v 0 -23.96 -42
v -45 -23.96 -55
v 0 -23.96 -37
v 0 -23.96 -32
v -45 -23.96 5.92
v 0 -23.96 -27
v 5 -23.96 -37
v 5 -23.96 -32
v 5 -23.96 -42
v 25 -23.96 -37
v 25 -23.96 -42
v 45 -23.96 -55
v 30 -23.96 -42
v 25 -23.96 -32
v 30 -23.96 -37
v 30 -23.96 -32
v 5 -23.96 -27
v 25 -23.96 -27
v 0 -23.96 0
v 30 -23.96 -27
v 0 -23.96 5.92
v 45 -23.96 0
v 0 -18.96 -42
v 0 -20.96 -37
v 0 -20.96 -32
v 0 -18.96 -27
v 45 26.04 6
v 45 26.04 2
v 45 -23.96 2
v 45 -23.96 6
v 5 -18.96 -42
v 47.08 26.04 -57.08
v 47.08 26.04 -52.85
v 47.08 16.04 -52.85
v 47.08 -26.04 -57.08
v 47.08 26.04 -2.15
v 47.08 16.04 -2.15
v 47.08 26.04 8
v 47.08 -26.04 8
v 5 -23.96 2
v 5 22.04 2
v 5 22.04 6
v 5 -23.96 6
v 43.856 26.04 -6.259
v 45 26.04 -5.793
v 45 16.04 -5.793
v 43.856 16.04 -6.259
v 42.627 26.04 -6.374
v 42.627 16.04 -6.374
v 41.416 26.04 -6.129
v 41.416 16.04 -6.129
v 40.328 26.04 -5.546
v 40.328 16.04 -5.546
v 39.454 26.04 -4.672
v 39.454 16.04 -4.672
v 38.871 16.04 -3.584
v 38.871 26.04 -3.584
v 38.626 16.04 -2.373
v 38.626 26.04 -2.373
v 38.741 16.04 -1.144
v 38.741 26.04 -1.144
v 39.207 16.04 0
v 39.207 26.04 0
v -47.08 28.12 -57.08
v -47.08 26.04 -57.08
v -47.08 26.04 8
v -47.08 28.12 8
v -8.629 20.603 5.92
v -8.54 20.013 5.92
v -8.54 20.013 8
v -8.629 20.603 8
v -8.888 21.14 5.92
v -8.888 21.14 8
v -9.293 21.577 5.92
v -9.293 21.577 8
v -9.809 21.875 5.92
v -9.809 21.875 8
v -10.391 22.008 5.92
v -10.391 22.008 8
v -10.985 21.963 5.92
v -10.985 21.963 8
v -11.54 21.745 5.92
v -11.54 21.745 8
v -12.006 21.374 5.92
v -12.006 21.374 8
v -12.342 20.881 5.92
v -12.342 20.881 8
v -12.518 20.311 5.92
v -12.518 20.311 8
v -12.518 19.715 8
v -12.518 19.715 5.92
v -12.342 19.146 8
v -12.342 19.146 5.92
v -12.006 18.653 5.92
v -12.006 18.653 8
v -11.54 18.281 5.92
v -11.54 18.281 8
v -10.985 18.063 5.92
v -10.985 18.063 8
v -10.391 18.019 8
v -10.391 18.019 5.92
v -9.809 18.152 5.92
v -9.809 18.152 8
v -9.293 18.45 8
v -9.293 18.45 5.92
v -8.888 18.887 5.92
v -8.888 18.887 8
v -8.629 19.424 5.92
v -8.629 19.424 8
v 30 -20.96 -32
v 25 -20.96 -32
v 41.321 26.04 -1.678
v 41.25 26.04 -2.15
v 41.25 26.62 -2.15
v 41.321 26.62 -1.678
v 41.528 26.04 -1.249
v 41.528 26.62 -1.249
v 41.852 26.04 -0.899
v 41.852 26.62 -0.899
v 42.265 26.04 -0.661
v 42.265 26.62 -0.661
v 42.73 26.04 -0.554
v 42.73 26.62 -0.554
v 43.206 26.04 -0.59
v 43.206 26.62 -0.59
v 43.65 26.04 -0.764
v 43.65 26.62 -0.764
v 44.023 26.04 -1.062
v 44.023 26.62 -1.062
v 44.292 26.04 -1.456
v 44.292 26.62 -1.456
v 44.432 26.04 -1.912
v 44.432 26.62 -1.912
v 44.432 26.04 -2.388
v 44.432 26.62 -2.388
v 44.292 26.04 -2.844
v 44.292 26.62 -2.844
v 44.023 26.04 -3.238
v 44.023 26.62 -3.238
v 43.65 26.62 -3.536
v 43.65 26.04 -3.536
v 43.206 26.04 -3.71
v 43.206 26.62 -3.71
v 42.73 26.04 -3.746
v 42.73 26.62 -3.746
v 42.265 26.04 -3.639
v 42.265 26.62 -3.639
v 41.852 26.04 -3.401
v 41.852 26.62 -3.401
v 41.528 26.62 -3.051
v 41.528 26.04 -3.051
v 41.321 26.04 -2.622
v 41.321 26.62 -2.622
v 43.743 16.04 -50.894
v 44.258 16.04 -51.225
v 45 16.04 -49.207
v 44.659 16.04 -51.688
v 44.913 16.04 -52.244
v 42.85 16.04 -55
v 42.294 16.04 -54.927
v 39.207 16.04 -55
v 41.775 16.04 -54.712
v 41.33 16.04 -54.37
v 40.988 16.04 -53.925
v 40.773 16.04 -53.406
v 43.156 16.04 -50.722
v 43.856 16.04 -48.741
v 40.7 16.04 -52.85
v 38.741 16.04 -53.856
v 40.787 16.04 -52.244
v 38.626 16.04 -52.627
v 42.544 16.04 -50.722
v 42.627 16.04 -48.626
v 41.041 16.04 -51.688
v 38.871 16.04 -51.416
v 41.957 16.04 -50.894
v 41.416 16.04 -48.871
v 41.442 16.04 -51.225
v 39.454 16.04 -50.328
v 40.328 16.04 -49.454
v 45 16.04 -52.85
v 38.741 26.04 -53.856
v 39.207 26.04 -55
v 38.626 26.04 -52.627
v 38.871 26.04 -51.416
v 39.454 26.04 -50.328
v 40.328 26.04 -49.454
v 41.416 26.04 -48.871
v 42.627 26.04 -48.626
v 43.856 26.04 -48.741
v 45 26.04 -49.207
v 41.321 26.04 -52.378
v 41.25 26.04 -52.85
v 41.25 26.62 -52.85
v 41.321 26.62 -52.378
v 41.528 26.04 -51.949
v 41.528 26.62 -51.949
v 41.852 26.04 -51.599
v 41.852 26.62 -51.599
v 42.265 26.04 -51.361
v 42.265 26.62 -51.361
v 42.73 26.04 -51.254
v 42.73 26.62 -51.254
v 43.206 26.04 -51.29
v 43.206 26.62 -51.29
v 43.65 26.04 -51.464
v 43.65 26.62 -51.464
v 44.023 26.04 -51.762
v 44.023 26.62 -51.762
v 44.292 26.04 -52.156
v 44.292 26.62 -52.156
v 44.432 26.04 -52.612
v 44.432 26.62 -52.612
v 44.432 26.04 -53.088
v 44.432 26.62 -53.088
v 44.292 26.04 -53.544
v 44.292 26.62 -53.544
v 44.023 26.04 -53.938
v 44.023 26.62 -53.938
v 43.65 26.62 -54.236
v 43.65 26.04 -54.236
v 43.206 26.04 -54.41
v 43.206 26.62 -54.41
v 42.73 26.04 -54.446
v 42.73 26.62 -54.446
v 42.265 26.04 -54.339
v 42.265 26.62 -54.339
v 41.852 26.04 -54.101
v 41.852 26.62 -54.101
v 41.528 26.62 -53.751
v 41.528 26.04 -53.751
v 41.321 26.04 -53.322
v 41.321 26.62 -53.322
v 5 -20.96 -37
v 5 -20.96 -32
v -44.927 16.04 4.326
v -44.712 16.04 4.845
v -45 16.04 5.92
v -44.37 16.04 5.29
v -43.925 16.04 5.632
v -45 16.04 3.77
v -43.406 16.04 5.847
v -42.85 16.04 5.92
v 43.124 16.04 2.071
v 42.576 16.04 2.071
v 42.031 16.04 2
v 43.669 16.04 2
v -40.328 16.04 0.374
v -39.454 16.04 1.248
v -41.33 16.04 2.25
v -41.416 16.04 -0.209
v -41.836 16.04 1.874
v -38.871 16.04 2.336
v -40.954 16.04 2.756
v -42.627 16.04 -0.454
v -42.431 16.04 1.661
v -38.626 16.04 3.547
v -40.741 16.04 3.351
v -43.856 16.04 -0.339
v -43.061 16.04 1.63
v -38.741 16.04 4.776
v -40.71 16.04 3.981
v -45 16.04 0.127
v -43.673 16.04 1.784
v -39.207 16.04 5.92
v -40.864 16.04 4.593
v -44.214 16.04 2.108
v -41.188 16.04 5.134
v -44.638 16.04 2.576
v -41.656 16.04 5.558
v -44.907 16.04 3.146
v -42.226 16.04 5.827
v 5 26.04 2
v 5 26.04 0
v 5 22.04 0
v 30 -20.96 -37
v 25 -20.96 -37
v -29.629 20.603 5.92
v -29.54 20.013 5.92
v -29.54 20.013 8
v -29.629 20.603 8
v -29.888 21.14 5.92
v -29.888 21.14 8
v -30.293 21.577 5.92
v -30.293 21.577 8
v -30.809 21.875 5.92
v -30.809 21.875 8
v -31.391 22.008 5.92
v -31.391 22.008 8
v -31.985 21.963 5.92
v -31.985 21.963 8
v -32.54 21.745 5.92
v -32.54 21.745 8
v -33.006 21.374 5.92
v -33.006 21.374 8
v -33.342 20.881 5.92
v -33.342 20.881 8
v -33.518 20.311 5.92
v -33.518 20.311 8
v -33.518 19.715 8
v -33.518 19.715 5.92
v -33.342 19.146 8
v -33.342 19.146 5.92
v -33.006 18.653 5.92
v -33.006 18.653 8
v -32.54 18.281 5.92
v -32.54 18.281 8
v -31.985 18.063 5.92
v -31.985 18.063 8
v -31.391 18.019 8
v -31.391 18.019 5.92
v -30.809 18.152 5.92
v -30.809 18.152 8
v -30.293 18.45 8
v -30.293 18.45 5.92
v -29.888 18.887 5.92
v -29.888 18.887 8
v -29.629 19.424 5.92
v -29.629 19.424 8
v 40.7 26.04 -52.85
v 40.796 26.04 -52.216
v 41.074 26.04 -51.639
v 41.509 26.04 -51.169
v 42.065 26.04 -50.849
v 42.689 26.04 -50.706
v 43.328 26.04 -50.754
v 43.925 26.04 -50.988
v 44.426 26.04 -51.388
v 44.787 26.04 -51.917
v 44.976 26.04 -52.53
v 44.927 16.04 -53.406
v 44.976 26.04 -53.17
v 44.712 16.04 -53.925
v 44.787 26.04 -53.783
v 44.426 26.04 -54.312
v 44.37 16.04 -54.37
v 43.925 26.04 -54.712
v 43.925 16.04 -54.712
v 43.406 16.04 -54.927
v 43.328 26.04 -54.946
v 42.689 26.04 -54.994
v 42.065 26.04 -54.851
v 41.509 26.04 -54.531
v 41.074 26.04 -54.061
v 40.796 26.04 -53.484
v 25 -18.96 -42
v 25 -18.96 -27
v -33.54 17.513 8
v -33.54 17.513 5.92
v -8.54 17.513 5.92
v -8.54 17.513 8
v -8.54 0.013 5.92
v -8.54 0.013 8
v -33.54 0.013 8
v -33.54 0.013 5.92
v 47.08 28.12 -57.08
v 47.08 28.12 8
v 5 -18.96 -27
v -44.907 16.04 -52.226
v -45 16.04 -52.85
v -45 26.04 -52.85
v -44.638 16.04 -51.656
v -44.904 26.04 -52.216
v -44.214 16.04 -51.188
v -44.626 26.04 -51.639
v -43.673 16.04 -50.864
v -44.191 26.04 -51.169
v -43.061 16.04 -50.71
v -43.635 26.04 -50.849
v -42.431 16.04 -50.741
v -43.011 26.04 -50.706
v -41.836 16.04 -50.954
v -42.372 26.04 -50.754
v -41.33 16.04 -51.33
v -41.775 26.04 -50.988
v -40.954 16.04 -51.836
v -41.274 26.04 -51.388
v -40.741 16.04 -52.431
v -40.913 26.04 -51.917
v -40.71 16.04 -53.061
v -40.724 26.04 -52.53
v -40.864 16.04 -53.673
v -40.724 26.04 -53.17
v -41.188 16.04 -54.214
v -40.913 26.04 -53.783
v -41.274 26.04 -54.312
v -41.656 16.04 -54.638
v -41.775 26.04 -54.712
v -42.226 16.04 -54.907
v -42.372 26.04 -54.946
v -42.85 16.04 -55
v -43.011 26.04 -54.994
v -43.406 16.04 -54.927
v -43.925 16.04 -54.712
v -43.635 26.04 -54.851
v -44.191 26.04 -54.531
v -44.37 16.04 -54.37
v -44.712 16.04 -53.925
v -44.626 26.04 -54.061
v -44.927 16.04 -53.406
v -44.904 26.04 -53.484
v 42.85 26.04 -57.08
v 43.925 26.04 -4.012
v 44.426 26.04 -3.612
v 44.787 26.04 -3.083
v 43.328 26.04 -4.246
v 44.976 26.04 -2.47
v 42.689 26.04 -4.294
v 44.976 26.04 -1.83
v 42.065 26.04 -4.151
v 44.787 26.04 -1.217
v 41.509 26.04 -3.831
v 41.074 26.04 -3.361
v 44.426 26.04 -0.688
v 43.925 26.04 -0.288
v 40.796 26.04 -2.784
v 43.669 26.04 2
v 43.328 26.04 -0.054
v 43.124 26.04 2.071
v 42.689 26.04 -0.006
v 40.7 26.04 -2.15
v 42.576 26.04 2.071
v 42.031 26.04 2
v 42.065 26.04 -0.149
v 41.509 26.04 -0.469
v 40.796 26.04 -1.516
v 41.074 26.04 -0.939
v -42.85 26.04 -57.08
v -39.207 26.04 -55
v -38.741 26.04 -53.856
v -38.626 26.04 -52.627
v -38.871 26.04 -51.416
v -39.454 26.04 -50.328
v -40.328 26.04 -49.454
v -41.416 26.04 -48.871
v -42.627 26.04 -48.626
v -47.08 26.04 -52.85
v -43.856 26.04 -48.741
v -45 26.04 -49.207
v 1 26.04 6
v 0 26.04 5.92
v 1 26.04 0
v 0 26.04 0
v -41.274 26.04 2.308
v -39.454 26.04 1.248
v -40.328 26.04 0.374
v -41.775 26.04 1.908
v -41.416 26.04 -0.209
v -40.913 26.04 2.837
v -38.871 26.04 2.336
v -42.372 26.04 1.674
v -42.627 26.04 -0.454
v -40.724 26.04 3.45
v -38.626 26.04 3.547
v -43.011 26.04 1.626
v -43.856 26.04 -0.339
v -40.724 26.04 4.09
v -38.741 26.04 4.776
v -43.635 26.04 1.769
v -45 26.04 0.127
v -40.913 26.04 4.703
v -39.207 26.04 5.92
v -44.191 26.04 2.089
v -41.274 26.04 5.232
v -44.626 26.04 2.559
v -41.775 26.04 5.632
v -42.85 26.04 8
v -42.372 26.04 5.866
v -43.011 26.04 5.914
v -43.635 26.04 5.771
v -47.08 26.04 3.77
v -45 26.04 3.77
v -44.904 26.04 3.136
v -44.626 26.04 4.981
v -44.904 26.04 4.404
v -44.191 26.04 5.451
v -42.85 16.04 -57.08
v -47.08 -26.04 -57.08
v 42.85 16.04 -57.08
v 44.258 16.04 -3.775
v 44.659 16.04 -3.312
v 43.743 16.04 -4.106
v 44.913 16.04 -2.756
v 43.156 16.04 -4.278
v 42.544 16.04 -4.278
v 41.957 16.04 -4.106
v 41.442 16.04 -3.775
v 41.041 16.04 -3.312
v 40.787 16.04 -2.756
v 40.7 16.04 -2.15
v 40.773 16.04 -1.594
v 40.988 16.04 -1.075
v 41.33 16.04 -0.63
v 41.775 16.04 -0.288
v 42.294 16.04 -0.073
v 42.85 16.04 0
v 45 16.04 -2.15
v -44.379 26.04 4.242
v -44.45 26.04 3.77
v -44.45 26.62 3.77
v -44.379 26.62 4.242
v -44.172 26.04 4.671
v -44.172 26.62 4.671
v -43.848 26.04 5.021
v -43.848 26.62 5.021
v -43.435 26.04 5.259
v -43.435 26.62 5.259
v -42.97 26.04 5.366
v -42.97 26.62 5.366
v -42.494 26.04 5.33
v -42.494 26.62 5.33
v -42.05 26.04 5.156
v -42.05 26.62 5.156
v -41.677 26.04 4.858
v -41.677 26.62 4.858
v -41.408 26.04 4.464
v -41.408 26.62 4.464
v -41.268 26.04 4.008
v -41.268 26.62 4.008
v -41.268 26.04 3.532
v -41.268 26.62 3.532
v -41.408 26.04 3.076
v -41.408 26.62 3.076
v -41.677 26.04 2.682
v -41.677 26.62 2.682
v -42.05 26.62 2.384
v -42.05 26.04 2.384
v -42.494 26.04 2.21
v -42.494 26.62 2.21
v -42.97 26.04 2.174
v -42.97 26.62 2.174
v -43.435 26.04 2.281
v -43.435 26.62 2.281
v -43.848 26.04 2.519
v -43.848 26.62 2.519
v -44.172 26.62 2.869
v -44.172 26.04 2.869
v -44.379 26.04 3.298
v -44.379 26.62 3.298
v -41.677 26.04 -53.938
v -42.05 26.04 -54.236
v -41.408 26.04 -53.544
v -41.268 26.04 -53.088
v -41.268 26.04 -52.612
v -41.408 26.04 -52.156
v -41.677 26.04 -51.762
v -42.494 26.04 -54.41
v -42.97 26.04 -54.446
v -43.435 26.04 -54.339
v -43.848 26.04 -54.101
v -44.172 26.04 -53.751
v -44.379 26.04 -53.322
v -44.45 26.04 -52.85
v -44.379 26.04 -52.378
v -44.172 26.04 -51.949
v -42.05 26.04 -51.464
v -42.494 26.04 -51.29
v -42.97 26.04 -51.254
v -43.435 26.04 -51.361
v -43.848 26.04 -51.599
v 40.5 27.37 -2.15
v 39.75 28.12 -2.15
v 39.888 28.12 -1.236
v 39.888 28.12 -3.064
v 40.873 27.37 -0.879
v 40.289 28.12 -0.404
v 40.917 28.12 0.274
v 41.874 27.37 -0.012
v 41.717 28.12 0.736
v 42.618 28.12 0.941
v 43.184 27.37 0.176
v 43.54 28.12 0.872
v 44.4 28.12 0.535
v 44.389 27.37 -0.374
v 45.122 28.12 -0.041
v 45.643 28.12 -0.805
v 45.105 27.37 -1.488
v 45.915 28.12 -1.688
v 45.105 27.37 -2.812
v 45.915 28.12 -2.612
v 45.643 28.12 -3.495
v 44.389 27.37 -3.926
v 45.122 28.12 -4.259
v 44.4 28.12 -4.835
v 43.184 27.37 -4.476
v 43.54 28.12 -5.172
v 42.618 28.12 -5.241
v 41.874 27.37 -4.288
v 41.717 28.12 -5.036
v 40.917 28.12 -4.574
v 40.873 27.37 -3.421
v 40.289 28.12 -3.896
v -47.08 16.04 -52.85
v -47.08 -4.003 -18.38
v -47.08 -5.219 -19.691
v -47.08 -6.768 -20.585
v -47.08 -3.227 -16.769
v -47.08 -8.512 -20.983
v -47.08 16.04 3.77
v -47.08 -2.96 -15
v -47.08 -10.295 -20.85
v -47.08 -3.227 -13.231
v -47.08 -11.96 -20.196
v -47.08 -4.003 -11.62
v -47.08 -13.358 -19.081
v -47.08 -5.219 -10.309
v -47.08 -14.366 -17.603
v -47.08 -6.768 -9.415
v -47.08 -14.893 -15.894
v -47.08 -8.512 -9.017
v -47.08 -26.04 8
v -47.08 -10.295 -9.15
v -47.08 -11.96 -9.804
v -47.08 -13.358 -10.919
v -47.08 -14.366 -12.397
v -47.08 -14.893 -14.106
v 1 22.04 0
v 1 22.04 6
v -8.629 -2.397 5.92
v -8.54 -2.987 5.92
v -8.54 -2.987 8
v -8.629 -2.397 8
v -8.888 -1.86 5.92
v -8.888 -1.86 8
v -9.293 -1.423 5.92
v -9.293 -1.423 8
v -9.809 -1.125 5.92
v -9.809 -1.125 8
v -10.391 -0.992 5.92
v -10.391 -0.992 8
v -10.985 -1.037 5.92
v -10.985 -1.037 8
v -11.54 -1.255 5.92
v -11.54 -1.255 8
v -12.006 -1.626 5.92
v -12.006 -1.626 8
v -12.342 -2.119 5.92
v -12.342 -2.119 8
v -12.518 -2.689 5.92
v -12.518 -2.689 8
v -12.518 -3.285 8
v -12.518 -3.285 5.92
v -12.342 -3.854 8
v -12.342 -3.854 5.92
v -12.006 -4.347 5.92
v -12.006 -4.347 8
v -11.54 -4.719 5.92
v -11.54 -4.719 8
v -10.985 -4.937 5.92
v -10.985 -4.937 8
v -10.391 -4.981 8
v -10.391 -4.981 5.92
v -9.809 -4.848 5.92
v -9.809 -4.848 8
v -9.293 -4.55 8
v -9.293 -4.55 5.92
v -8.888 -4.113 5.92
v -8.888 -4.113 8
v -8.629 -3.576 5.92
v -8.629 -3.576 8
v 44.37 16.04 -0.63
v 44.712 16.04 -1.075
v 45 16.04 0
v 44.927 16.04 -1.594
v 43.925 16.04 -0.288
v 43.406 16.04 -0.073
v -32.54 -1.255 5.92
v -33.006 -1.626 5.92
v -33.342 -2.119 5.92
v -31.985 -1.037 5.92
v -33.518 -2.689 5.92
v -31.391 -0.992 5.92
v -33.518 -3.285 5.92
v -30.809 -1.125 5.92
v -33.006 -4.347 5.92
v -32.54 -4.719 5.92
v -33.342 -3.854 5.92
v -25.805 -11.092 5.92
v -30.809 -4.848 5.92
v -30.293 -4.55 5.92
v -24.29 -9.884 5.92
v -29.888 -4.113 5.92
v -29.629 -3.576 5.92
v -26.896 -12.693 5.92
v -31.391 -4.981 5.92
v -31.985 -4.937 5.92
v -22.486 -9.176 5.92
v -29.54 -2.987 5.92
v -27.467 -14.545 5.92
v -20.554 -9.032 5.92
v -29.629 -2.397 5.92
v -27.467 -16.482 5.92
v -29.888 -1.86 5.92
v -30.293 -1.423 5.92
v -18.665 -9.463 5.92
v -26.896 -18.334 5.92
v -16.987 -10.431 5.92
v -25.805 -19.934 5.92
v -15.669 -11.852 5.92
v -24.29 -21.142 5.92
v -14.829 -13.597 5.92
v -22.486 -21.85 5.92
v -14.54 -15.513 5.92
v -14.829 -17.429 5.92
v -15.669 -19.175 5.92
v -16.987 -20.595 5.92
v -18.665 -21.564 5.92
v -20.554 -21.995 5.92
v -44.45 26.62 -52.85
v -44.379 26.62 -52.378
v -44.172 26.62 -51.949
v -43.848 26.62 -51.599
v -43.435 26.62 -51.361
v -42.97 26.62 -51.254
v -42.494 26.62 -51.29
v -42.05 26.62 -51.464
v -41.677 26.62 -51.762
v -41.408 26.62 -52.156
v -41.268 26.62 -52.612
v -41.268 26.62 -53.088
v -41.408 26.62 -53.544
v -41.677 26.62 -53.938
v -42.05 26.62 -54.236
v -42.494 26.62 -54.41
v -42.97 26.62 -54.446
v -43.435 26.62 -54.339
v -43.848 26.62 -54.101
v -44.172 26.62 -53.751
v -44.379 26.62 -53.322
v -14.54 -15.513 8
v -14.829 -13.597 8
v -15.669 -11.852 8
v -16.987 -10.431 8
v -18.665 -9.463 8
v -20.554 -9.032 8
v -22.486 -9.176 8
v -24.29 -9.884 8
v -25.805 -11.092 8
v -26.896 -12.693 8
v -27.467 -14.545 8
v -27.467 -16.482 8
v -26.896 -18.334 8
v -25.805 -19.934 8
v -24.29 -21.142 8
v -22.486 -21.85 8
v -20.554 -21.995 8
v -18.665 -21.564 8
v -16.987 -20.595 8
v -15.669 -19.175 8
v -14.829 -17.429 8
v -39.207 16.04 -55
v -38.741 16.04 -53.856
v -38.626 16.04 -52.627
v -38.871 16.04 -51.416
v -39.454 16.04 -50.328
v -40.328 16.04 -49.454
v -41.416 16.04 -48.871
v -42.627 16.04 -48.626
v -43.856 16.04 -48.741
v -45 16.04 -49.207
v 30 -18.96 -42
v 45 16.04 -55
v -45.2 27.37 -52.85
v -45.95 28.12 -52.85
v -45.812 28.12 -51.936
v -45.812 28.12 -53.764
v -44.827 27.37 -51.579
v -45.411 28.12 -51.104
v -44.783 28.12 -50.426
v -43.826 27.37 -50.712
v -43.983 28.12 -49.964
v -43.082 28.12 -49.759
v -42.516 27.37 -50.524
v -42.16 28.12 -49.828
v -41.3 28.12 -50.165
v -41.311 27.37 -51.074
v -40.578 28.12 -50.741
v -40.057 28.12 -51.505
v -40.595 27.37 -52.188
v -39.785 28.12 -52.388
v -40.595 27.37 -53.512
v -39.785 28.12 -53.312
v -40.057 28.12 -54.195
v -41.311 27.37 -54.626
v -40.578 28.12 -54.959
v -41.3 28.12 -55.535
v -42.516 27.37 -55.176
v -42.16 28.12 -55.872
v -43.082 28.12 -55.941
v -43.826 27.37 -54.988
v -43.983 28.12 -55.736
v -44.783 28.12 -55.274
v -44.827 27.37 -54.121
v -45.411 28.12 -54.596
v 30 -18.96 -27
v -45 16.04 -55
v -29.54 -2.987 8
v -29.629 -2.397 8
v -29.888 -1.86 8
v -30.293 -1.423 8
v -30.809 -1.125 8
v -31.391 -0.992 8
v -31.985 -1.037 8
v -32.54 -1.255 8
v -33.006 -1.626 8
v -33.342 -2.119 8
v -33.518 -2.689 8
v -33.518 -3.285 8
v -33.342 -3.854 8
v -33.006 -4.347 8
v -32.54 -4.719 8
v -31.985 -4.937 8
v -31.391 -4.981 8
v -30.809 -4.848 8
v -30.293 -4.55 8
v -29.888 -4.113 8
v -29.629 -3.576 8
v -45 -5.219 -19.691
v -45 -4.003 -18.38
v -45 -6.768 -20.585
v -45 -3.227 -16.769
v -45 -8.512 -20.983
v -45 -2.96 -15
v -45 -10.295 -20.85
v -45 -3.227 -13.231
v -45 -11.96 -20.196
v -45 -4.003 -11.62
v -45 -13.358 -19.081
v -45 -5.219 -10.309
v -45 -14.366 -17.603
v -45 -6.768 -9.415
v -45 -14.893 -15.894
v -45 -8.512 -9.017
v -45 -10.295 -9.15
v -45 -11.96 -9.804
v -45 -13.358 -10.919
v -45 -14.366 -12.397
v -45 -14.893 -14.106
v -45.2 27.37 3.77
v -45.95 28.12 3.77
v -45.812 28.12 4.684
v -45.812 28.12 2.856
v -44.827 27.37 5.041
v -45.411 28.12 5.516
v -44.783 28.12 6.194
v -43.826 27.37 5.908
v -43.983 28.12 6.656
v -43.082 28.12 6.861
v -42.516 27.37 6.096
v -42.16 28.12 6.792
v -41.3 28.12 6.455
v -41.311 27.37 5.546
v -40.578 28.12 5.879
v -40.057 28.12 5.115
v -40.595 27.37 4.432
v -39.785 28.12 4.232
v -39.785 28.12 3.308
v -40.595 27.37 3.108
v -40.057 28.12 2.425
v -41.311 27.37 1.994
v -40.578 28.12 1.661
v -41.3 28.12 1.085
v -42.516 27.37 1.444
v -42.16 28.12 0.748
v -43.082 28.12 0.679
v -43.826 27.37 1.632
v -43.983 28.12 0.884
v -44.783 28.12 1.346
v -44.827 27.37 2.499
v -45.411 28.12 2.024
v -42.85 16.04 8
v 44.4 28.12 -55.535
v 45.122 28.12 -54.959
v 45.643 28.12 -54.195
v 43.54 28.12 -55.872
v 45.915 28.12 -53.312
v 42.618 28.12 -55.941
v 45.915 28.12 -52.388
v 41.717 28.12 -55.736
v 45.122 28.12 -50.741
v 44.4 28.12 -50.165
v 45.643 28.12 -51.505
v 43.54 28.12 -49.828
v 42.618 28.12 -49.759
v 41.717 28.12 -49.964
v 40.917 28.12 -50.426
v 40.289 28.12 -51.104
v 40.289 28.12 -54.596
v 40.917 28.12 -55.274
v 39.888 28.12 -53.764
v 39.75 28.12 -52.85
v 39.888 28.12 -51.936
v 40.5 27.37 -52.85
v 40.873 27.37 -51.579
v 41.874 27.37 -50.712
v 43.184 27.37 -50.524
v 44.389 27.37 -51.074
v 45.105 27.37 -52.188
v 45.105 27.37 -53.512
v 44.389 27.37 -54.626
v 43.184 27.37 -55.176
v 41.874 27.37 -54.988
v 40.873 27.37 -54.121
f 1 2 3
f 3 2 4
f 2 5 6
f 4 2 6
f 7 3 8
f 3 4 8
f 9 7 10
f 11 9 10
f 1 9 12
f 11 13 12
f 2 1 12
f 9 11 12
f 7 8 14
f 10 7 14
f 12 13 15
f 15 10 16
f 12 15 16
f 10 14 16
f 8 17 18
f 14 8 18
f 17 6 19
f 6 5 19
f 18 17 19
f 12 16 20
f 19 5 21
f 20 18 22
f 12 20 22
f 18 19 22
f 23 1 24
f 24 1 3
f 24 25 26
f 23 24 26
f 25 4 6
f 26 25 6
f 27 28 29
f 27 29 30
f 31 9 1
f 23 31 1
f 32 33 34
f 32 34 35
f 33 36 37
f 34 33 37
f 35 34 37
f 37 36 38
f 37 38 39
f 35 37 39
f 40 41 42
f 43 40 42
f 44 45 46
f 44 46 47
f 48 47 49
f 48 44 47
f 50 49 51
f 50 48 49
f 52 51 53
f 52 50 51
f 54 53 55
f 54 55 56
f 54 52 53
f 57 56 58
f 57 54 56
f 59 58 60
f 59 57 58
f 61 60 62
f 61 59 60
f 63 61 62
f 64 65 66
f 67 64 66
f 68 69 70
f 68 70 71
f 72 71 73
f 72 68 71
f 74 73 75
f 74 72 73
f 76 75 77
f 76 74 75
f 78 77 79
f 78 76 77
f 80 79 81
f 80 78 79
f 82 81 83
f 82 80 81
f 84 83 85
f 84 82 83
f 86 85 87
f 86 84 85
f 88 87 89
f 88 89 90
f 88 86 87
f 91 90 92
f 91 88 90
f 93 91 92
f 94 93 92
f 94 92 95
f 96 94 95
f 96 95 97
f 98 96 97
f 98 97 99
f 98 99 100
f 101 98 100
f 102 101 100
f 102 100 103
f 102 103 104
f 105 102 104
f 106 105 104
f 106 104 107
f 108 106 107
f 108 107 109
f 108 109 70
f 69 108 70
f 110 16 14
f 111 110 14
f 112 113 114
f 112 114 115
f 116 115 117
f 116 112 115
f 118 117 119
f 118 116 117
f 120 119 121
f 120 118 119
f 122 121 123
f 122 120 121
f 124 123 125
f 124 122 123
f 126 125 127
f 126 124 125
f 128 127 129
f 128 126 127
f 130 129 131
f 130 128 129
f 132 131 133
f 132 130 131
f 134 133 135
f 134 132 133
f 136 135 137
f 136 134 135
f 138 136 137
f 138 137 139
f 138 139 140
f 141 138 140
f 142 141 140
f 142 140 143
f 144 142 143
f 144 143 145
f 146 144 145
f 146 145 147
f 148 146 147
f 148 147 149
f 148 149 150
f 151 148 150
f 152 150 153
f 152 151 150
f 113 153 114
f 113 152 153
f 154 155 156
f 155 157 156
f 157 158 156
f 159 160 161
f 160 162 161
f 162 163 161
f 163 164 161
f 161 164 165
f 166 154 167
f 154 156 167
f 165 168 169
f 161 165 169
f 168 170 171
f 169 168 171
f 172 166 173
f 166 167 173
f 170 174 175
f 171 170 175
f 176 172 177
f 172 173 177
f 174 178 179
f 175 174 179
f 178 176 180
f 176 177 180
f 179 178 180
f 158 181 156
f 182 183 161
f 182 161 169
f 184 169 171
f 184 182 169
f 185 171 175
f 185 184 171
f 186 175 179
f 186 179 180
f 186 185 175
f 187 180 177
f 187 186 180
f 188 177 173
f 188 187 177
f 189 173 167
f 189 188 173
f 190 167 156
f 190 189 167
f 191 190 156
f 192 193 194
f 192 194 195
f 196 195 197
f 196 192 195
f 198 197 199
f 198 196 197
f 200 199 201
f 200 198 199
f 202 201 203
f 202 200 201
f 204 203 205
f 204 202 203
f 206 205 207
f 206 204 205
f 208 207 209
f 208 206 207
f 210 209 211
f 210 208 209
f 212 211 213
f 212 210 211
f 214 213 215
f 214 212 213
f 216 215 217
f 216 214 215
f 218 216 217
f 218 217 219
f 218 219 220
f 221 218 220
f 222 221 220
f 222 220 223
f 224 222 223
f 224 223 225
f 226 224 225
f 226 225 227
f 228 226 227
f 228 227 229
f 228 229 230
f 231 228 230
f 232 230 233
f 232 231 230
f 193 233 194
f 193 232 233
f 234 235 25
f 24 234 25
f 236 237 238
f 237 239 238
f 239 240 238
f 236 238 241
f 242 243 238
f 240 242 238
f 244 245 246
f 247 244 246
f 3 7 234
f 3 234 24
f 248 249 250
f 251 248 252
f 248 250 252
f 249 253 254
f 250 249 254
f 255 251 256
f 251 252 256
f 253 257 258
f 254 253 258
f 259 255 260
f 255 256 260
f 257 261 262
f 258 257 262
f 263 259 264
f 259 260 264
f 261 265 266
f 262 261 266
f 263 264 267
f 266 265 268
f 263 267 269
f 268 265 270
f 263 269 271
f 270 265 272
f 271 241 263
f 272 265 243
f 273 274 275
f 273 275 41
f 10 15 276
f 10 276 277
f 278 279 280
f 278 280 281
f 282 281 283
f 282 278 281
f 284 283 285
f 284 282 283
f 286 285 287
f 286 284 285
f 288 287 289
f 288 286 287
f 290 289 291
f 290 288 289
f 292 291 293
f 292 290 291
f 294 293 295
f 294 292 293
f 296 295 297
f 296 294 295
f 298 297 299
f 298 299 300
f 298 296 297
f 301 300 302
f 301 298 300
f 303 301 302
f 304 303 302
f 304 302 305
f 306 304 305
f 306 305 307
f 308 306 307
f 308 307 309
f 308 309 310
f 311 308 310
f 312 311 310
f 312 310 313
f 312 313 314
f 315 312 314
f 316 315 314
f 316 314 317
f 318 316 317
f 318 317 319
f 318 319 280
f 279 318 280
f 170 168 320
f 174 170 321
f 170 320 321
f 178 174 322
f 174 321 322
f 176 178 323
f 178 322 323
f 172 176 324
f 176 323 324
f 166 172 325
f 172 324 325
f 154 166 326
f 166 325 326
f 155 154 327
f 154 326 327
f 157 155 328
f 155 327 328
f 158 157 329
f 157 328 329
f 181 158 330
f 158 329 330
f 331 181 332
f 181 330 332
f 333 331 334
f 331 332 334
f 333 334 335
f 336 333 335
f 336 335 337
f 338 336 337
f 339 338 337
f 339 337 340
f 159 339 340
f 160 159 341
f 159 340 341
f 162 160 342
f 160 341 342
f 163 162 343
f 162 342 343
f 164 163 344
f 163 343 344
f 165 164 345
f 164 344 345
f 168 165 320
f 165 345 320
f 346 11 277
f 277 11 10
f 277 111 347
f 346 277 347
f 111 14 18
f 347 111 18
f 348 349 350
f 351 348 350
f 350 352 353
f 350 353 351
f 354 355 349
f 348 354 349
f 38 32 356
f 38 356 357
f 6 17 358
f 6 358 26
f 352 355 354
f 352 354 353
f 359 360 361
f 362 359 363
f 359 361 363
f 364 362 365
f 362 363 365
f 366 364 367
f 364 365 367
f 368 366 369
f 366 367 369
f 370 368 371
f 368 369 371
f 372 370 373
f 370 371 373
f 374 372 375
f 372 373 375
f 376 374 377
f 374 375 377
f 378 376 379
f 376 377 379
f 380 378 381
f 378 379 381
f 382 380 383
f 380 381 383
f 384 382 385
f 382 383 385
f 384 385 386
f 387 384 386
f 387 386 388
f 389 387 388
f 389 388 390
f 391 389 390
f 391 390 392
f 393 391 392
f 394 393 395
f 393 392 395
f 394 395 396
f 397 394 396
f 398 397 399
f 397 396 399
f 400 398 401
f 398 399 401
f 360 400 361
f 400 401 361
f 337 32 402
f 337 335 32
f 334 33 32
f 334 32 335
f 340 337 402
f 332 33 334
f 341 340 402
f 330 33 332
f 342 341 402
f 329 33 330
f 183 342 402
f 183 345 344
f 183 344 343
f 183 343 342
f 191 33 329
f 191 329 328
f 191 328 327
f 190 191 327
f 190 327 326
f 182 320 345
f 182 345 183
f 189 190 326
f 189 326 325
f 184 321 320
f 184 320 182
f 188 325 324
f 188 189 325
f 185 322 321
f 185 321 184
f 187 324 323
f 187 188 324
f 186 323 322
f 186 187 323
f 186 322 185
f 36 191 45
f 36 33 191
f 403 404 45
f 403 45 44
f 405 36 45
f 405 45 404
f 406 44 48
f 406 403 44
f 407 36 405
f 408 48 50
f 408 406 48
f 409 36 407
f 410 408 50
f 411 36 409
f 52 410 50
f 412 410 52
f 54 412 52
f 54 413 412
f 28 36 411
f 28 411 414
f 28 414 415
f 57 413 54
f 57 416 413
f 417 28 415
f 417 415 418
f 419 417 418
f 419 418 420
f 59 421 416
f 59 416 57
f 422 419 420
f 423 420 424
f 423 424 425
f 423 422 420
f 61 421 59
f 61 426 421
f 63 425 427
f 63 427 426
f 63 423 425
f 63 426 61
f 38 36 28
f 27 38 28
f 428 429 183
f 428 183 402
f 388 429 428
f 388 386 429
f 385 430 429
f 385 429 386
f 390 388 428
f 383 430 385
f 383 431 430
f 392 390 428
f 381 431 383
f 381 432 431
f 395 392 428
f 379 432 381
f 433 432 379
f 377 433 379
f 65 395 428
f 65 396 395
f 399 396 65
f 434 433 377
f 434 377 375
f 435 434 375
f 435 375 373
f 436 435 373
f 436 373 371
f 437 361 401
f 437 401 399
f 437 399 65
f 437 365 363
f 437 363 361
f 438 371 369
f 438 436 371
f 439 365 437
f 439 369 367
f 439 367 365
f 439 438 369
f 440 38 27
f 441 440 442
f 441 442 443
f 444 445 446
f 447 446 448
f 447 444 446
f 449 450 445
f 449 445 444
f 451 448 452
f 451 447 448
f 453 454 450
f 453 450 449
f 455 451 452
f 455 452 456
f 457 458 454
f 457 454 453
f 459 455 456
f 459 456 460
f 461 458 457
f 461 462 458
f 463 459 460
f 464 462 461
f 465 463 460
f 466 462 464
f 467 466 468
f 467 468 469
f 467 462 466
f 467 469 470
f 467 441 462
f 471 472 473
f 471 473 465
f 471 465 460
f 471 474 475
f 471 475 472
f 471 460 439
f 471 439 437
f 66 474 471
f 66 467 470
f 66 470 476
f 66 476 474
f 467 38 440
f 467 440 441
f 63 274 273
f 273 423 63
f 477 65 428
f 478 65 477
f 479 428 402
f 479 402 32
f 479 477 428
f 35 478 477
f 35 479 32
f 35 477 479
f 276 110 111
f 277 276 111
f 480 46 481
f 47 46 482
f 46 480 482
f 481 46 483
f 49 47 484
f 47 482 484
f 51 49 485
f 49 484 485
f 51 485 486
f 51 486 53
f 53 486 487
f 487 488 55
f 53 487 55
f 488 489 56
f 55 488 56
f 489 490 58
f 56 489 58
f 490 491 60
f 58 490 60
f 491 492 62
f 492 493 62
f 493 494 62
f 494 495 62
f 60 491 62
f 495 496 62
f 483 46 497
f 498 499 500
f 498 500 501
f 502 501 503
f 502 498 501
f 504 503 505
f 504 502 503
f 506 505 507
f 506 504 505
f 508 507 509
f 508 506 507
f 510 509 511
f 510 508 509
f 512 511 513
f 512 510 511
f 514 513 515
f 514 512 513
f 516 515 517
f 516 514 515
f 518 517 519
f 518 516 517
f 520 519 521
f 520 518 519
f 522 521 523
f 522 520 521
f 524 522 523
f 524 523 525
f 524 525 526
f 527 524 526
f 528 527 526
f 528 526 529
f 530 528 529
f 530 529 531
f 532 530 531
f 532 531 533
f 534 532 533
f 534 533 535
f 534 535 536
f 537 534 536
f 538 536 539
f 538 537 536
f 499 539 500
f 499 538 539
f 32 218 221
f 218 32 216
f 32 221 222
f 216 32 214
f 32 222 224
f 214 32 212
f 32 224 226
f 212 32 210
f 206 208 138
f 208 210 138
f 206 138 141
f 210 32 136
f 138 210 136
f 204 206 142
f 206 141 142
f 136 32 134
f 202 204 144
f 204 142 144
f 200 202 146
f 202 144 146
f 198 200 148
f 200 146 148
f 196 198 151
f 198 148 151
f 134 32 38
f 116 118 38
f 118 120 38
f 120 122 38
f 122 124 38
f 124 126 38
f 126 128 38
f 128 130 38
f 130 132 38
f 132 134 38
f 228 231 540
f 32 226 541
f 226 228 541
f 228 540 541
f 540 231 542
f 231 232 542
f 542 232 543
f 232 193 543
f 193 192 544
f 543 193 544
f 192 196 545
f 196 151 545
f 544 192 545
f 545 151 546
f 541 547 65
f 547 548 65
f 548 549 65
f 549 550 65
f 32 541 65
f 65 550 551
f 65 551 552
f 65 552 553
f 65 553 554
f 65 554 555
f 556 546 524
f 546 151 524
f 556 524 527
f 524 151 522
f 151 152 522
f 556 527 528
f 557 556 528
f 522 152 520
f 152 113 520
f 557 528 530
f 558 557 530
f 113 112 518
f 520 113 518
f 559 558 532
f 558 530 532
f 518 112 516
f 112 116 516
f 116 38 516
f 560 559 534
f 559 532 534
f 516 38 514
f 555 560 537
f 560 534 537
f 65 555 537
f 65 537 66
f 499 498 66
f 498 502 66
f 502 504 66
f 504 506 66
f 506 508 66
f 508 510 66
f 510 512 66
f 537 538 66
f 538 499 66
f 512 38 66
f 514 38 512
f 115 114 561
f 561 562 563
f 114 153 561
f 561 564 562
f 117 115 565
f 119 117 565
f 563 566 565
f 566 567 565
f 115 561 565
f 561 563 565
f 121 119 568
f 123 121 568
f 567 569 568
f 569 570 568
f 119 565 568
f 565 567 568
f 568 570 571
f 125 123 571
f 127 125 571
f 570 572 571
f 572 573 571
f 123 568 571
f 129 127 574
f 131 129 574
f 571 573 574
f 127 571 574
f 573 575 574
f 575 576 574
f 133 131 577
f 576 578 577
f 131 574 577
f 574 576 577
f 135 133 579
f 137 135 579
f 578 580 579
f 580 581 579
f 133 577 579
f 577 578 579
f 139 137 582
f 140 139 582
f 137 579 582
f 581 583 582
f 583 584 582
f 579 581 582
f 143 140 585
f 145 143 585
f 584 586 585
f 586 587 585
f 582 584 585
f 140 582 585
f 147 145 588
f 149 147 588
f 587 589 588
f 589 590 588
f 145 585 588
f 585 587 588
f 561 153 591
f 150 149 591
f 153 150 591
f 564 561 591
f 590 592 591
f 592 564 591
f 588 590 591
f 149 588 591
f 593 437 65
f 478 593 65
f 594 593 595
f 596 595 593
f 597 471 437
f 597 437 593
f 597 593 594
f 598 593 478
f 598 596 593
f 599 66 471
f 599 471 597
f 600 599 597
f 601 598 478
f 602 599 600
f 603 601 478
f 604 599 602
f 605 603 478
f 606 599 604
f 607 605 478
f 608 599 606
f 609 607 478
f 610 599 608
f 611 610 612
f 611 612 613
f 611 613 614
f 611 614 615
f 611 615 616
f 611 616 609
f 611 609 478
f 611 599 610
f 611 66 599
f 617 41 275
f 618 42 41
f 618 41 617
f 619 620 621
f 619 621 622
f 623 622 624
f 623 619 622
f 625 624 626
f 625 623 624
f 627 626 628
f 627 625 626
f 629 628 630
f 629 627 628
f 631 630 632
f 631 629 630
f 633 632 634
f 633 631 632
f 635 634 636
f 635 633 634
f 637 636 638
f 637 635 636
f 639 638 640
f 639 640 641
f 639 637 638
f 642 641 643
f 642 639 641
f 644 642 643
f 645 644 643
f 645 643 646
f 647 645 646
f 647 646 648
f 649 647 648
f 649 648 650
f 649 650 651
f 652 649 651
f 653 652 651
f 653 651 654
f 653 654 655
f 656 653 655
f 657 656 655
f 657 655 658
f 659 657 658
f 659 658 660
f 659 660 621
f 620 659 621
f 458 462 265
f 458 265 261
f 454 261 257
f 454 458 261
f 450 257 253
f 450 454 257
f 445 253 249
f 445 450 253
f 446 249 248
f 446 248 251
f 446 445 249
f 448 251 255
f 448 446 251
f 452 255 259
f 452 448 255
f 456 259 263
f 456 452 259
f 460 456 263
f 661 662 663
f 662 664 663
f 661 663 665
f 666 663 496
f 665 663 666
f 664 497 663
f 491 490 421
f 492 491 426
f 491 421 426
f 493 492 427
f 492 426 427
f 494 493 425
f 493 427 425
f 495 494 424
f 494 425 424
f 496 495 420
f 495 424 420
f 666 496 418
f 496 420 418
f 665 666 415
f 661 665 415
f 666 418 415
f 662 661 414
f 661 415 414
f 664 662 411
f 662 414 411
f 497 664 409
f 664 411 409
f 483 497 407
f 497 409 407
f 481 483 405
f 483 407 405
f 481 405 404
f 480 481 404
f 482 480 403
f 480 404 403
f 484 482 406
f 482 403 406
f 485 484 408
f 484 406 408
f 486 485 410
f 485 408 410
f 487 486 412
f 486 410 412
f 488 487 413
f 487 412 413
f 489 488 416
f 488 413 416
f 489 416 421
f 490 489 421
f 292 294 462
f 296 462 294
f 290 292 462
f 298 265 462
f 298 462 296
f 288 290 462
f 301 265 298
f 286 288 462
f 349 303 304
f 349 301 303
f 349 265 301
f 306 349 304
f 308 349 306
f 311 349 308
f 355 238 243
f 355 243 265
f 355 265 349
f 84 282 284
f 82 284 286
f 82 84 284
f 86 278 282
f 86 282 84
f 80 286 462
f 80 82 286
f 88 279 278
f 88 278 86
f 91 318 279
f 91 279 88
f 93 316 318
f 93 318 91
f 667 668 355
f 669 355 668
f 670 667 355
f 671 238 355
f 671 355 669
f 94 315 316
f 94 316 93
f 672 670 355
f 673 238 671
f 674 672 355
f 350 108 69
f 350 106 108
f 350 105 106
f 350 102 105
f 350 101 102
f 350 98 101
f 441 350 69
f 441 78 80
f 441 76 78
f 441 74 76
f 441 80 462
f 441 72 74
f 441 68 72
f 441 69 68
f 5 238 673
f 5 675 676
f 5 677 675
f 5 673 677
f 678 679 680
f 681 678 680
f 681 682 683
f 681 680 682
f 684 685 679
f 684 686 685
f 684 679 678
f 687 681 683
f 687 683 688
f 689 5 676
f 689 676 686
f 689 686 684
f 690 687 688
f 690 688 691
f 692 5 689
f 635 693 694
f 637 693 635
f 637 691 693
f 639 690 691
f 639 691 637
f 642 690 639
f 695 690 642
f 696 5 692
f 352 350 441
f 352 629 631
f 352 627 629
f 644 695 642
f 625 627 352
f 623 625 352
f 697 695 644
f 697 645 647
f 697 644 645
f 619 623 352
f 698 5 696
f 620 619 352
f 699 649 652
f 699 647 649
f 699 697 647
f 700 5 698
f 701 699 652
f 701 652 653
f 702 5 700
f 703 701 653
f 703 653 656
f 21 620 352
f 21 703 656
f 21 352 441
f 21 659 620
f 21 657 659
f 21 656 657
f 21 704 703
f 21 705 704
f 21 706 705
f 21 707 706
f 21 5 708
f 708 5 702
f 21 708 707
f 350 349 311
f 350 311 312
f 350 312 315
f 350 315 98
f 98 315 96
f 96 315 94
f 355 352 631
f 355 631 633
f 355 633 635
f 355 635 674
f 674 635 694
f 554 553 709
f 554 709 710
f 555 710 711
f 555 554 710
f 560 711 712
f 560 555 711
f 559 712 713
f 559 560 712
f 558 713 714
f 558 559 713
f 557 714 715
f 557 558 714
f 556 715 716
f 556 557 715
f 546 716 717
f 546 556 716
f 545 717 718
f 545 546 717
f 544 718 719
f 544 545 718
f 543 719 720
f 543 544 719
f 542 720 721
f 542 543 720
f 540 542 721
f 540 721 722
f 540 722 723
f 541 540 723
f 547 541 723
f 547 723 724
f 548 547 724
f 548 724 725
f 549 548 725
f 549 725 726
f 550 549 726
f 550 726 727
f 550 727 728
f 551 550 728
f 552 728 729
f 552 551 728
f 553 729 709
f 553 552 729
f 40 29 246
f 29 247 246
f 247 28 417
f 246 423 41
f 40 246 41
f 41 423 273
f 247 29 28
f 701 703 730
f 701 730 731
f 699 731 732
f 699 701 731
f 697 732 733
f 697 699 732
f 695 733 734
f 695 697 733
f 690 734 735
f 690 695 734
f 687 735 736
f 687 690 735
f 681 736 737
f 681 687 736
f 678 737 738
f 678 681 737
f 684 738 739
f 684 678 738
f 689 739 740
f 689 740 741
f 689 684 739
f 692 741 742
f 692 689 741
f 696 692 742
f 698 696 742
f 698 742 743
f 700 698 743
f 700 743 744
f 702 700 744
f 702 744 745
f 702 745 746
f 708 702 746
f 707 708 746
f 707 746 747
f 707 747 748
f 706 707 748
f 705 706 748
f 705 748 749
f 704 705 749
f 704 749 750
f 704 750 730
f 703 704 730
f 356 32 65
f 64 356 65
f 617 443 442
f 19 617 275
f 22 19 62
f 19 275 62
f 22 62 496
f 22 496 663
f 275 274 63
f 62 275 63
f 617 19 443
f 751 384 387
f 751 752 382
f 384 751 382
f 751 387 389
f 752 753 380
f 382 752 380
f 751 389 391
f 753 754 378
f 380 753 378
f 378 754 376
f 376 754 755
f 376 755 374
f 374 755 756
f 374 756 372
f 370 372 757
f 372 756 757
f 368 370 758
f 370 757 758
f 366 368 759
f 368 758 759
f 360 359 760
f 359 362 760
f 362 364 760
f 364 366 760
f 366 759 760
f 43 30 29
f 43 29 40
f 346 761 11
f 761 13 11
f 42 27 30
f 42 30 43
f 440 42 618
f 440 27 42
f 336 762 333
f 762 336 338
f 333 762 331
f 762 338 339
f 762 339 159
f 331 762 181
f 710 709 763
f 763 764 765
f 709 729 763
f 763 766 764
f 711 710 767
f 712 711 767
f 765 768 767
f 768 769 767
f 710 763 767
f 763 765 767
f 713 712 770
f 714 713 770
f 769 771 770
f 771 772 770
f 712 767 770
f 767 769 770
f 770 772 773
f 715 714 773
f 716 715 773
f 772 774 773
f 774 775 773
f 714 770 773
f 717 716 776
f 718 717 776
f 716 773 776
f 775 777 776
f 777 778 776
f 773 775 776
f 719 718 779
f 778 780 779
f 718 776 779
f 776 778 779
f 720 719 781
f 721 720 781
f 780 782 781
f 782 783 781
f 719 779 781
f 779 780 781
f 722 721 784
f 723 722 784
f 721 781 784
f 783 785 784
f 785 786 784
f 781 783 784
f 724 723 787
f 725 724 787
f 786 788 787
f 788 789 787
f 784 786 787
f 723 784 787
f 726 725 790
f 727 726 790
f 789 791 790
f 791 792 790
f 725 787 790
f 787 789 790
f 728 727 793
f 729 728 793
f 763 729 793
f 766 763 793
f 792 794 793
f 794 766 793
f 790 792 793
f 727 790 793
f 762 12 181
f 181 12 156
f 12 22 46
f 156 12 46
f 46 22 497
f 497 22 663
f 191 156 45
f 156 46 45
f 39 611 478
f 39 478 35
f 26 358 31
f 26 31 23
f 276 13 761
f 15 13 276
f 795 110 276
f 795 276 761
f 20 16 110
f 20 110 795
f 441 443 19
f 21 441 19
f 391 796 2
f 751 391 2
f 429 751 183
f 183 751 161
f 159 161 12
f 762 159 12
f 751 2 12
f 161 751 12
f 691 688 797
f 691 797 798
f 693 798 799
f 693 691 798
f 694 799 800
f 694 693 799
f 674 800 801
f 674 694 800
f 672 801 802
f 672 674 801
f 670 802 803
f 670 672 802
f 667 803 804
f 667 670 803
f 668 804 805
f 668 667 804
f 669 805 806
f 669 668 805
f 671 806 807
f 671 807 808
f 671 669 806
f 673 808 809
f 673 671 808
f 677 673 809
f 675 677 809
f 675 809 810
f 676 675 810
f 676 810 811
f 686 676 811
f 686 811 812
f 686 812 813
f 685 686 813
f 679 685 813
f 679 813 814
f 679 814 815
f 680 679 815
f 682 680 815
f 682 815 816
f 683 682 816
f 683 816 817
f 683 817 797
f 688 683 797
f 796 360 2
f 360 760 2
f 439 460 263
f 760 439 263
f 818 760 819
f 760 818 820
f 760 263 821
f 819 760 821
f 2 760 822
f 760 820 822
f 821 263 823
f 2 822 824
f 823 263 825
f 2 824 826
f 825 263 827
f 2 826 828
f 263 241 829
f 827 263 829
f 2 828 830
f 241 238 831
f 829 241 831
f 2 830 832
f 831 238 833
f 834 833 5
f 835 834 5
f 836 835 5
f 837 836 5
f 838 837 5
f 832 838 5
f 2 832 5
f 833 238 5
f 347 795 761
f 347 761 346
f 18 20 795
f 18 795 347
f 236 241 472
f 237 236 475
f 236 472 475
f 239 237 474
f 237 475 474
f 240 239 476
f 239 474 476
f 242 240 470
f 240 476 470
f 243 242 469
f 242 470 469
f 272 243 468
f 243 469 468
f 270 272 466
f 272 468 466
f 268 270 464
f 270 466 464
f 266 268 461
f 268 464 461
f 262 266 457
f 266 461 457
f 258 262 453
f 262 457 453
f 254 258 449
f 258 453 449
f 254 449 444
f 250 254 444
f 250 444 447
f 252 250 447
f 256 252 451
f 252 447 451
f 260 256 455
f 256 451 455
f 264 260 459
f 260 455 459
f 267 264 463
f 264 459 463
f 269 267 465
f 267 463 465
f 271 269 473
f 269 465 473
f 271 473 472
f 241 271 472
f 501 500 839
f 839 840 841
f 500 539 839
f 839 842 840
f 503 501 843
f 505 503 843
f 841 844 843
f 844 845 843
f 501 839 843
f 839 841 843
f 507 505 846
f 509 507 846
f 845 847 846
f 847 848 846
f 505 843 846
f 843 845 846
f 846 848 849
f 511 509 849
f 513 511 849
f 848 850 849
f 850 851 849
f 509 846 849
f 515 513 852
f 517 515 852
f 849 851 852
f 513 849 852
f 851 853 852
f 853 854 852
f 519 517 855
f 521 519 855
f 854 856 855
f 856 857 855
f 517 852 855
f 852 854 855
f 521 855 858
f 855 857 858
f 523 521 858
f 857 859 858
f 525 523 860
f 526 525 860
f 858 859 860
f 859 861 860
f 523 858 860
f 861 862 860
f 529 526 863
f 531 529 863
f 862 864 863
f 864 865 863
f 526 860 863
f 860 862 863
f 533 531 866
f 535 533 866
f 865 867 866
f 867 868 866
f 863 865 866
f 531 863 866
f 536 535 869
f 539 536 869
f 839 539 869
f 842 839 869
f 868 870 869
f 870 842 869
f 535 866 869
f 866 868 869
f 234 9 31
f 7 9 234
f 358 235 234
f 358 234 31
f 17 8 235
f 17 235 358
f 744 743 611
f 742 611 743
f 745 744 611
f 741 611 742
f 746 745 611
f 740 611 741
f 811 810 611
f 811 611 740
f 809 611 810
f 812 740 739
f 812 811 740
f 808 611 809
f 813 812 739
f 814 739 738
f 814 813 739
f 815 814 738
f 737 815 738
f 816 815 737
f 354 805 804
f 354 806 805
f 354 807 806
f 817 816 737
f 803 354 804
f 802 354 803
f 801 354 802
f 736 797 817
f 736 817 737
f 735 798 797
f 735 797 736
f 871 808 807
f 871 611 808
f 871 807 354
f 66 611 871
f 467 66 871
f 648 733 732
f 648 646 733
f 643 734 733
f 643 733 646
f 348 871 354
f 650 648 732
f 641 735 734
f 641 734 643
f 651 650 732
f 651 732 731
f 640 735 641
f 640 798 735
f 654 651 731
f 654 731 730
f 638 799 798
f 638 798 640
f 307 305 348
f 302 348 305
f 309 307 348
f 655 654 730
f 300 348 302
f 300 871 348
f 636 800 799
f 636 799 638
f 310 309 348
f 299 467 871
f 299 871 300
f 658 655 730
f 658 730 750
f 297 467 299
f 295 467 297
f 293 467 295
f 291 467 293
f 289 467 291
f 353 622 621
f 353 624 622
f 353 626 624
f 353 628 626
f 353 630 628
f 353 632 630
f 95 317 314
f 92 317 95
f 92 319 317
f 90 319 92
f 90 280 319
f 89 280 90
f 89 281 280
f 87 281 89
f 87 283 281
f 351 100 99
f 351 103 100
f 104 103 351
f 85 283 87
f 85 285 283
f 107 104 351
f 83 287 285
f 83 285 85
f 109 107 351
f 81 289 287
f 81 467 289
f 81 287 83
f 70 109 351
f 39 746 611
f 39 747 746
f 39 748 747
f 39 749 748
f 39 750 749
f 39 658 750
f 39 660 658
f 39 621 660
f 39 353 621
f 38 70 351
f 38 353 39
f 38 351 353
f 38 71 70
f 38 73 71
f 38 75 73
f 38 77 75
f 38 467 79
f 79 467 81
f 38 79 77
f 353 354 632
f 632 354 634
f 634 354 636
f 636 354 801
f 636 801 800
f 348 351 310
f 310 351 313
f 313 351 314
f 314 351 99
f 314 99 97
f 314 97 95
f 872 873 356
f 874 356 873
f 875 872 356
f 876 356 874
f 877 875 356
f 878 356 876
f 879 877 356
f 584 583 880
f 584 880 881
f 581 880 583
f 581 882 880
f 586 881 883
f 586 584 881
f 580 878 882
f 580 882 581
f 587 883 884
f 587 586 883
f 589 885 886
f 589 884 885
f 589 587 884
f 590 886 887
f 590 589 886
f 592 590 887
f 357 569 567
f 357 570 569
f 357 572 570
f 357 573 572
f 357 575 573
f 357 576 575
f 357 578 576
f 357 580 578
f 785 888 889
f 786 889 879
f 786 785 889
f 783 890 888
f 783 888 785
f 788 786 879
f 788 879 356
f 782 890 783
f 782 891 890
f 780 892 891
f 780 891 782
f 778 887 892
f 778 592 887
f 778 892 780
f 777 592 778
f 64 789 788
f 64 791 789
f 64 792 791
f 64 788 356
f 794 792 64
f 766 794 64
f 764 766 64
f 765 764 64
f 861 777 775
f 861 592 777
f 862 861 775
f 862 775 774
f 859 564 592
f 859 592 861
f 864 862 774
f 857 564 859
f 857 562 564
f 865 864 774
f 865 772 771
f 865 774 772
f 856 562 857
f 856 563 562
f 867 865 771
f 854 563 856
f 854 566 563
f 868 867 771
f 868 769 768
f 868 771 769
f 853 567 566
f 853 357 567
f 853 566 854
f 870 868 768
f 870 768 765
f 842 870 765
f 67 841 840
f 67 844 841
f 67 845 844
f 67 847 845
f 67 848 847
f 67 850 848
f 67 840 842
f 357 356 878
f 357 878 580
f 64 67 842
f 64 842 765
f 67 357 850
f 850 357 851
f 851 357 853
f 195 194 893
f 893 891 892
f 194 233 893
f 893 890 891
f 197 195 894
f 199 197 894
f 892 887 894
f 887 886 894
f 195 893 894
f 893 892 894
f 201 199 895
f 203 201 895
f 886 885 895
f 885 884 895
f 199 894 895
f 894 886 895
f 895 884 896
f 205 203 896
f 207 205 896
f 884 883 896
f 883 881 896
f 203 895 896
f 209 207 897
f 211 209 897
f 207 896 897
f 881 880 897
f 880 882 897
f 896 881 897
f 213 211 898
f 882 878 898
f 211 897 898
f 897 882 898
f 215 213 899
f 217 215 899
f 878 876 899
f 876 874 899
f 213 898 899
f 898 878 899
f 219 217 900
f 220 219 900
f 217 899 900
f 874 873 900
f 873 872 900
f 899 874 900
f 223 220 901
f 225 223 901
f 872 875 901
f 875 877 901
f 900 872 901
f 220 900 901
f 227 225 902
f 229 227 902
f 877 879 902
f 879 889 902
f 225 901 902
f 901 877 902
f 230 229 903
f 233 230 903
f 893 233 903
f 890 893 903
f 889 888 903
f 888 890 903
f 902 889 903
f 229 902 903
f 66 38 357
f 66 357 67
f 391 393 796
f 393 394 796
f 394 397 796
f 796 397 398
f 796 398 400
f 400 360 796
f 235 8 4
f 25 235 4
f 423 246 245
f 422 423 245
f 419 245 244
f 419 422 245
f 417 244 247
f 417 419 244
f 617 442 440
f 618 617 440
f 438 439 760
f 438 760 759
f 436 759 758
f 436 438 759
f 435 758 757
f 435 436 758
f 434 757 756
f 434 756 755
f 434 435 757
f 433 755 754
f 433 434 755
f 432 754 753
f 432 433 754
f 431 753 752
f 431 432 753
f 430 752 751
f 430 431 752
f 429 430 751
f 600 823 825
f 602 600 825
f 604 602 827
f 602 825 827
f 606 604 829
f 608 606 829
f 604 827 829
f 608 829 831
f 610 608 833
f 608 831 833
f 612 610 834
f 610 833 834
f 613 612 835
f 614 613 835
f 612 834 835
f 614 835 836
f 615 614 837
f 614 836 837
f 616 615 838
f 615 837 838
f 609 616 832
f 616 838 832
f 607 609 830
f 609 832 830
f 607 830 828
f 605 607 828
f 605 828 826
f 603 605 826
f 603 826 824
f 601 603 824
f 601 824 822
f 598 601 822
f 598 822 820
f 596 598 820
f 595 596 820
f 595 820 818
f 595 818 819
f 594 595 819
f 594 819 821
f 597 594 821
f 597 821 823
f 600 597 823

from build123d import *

# Parameters (mm, degrees)
SKETCH_W        = 94.16
SKETCH_H        = 52.08
SKETCH_R        = 2
SKETCH_R_2      = 6.5
SKETCH_W_2      = 25
SKETCH_H_2      = 17.5
PAD_DEPTH       = 8
SKETCH001_W     = 40
SKETCH001_H     = 4
POCKET_DEPTH    = 50
SKETCH002_W     = 4
SKETCH002_H     = 6
POCKET001_DEPTH = 4
PAD001_DEPTH    = 55
SKETCH004_W     = 94.16
SKETCH004_H     = 52.08
PAD002_DEPTH    = 2.08
SKETCH005_W     = 5
SKETCH005_H     = 5
PAD003_DEPTH    = 3
SKETCH006_W     = 5
SKETCH006_H     = 15
PAD004_DEPTH    = 2
SKETCH007_W     = 45
SKETCH007_H     = 50
POCKET002_DEPTH = 5.92
SKETCH008_R     = 6
POCKET003_DEPTH = 2.081
SKETCH009_R     = 4.23
SKETCH009_R_2   = 2.15
PAD005_DEPTH    = 10
SKETCH010_W     = 94.16
SKETCH010_H     = 65.08
SKETCH010_R     = 1.6
PAD006_DEPTH    = 2.08
CHAMFER_SIZE    = 1.5


with BuildPart() as body:
    # Sketch → Pad (new body)
    with BuildSketch(Plane.XY):
        Rectangle(SKETCH_W, SKETCH_H)
        with Locations((-10.54, 20.013333)):
            Circle(SKETCH_R, mode=Mode.SUBTRACT)
        with Locations((-31.54, -2.986667)):
            Circle(SKETCH_R, mode=Mode.SUBTRACT)
        with Locations((-31.54, 20.013333)):
            Circle(SKETCH_R, mode=Mode.SUBTRACT)
        with Locations((-10.54, -2.986667)):
            Circle(SKETCH_R, mode=Mode.SUBTRACT)
        with Locations((-21.04, -15.513333)):
            Circle(SKETCH_R_2, mode=Mode.SUBTRACT)
        with Locations((-21.04, 8.763333)):
            Rectangle(SKETCH_W_2, SKETCH_H_2, mode=Mode.SUBTRACT)
    extrude(amount=PAD_DEPTH)

    # Sketch001 (on Face1 of Pad) → Pocket (cut)
    with BuildSketch(Plane(origin=(0, 26.04, 0), x_dir=(-1, 0, 0), z_dir=(0, 1, 0))):
        with Locations((-25, 4)):
            Rectangle(SKETCH001_W, SKETCH001_H)
    extrude(amount=-POCKET_DEPTH, mode=Mode.SUBTRACT)

    # Sketch002 (on Face1 of Pocket) → Pocket001 (cut)
    with BuildSketch(Plane(origin=(0, 26.04, 0), x_dir=(-1, 0, 0), z_dir=(0, 1, 0))):
        with Locations((-3, 3)):
            Rectangle(SKETCH002_W, SKETCH002_H)
    extrude(amount=-POCKET001_DEPTH, mode=Mode.SUBTRACT)

    # Sketch003 (on Face2 of Pocket001) → Pad001 (join)
    with BuildSketch(Plane(origin=(0, 0, 0), x_dir=(1, 0, 0), z_dir=(0, 0, -1))):
        Polygon((-45, 23.96), (45, 23.96), (45, -26.04), (47.08, -26.04), (47.08, 26.04), (-47.08, 26.04), (-47.08, -26.04), (-45, -26.04), align=None)
    extrude(amount=PAD001_DEPTH)

    # Sketch004 (on Face16 of Pad001) → Pad002 (join)
    with BuildSketch(Plane(origin=(0, 0, -55), x_dir=(1, 0, 0), z_dir=(0, 0, -1))):
        Rectangle(SKETCH004_W, SKETCH004_H)
    extrude(amount=PAD002_DEPTH)

    # Sketch005 (on Face19 of Pad002) → Pad003 (join)
    with BuildSketch(Plane(origin=(0, -23.96, 0), x_dir=(-1, 0, 0), z_dir=(0, 1, 0))):
        with Locations((-27.5, -39.5)):
            Rectangle(SKETCH005_W, SKETCH005_H)
        with Locations((-27.5, -29.5)):
            Rectangle(SKETCH005_W, SKETCH005_H)
        with Locations((-2.5, -29.5)):
            Rectangle(SKETCH005_W, SKETCH005_H)
        with Locations((-2.5, -39.5)):
            Rectangle(SKETCH005_W, SKETCH005_H)
    extrude(amount=PAD003_DEPTH)

    # Sketch006 (on Face55 of Pad003) → Pad004 (join)
    with BuildSketch(Plane(origin=(0, -20.96, 0), x_dir=(-1, 0, 0), z_dir=(0, 1, 0))):
        with Locations((-27.5, -34.5)):
            Rectangle(SKETCH006_W, SKETCH006_H)
        with Locations((-2.5, -34.5)):
            Rectangle(SKETCH006_W, SKETCH006_H)
    extrude(amount=PAD004_DEPTH)

    # Sketch007 (on Face3 of Pad004) → Pocket002 (cut)
    with BuildSketch(Plane(origin=(0, 0, 0), x_dir=(1, 0, 0), z_dir=(0, 0, -1))):
        with Locations((-22.5, -1.04)):
            Rectangle(SKETCH007_W, SKETCH007_H)
    extrude(amount=-POCKET002_DEPTH, mode=Mode.SUBTRACT)

    # Sketch008 (on Face18 of Pocket002) → Pocket003 (cut, through all)
    with BuildSketch(Plane.YZ.offset(-45)):
        with Locations((-8.96, -15)):
            Circle(SKETCH008_R)
    extrude(amount=-POCKET003_DEPTH, mode=Mode.SUBTRACT)

    # Sketch009 (on Face13 of Pocket003) → Pad005 (join)
    with BuildSketch(Plane(origin=(0, 26.04, 0), x_dir=(-1, 0, 0), z_dir=(0, 1, 0))):
        with Locations((-42.85, -2.15)):
            Circle(SKETCH009_R)
        with Locations((-42.85, -2.15)):
            Circle(SKETCH009_R_2, mode=Mode.SUBTRACT)
        with Locations((42.85, -52.85)):
            Circle(SKETCH009_R)
        with Locations((42.85, -52.85)):
            Circle(SKETCH009_R_2, mode=Mode.SUBTRACT)
        with Locations((42.85, 3.77)):
            Circle(SKETCH009_R)
        with Locations((42.85, 3.77)):
            Circle(SKETCH009_R_2, mode=Mode.SUBTRACT)
        with Locations((-42.85, -52.85)):
            Circle(SKETCH009_R)
        with Locations((-42.85, -52.85)):
            Circle(SKETCH009_R_2, mode=Mode.SUBTRACT)
    extrude(amount=-PAD005_DEPTH)


with BuildPart() as lid:
    # Sketch010 (on Face1 of ShapeBinder) → Pad006 (new body)
    with BuildSketch(Plane(origin=(0, 26.04, 0), x_dir=(-1, 0, 0), z_dir=(0, 1, 0))):
        with Locations((0, -24.54)):
            Rectangle(SKETCH010_W, SKETCH010_H)
        with Locations((-42.85, -2.15)):
            Circle(SKETCH010_R, mode=Mode.SUBTRACT)
        with Locations((42.85, 3.77)):
            Circle(SKETCH010_R, mode=Mode.SUBTRACT)
        with Locations((42.85, -52.85)):
            Circle(SKETCH010_R, mode=Mode.SUBTRACT)
        with Locations((-42.85, -52.85)):
            Circle(SKETCH010_R, mode=Mode.SUBTRACT)
    extrude(amount=PAD006_DEPTH)

    # Chamfer
    chamfer_edges = [lid.edges().sort_by_distance(p)[0] for p in [
        (44.45, 28.12, -52.85),
        (44.45, 28.12, -2.15),
        (-41.25, 28.12, 3.77),
        (-41.25, 28.12, -52.85),
    ]]
    chamfer(chamfer_edges, length=CHAMFER_SIZE)


solid = Compound([body.part, lid.part])
